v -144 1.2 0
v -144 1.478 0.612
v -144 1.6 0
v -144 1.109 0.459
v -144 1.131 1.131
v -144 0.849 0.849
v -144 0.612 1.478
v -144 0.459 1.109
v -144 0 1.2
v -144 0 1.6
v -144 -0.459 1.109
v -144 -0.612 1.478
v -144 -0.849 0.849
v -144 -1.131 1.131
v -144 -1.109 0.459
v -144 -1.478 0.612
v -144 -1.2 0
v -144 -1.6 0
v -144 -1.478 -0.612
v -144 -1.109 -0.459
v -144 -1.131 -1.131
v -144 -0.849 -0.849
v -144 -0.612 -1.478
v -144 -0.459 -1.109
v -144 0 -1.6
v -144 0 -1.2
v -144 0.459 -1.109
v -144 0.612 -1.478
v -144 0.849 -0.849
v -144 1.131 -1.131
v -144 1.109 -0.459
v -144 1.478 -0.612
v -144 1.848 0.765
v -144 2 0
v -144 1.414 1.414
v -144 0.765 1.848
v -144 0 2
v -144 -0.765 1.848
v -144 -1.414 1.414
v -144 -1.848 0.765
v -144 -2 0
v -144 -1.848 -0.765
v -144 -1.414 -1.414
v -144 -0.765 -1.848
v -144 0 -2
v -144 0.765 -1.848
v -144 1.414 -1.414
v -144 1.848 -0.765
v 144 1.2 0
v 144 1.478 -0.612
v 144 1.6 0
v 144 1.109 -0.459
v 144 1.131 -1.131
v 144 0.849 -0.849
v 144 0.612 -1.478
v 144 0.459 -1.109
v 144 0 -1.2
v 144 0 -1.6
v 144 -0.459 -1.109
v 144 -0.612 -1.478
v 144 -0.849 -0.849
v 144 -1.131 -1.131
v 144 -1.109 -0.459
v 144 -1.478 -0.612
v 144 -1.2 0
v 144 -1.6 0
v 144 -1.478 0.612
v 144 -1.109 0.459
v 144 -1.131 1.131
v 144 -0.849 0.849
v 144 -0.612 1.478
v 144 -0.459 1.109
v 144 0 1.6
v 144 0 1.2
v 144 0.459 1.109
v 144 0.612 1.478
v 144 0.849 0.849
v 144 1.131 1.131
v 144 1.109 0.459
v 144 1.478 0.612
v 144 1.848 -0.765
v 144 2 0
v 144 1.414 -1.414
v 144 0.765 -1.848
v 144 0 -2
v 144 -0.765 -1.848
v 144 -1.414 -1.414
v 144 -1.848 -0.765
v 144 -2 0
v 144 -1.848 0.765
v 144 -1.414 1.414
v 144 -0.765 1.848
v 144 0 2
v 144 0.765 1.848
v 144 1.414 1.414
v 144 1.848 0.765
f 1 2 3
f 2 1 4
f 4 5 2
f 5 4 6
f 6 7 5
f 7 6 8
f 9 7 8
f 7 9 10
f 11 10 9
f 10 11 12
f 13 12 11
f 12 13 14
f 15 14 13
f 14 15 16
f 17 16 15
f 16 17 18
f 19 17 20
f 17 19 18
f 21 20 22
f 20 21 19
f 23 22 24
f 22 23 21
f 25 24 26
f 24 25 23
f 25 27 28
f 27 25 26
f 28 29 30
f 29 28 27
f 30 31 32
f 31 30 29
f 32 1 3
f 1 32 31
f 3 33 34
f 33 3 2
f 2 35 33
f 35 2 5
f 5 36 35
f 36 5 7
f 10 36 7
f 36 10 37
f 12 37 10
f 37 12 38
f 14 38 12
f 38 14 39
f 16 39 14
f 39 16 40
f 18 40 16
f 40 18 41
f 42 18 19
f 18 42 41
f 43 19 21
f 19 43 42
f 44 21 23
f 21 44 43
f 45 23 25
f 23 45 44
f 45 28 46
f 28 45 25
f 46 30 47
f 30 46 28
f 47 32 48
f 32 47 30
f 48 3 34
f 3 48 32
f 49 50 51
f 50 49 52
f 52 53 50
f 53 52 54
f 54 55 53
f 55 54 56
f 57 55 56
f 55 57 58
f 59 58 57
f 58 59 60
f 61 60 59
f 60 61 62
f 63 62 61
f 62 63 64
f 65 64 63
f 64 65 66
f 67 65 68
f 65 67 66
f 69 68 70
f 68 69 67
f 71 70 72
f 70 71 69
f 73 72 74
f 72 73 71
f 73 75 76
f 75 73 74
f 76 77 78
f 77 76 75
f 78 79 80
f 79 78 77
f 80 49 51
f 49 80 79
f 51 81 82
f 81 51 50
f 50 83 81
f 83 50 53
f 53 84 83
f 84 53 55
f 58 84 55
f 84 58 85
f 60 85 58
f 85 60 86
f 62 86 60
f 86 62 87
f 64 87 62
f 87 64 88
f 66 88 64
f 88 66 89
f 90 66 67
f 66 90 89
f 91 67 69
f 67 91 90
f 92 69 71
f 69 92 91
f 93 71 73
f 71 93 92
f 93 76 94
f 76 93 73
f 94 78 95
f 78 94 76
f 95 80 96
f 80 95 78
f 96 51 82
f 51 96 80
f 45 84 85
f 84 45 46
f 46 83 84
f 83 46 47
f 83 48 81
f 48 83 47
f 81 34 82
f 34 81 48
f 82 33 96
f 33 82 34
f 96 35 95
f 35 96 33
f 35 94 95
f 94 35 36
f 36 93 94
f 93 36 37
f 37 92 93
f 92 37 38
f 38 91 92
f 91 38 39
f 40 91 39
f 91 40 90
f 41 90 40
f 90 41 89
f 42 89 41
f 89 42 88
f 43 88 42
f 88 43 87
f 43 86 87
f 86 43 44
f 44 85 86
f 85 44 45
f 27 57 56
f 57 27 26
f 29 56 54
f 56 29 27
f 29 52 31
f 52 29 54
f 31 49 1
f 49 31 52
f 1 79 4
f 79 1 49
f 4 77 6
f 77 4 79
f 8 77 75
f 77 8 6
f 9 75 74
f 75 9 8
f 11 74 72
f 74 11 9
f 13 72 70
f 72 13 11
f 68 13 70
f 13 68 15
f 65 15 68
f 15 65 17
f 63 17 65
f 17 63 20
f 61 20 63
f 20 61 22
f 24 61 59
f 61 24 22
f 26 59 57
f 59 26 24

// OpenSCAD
// file: ../p/4-4cyli.scad
use <../lib.scad>
function ldraw_lib__4_4cyli() = [
// 0 Cylinder 1.0
// 0 Name: 4-4cyli.dat
// 0 Author: James Jessiman
// 0 !LDRAW_ORG Primitive UPDATE 2005-01
// 0 !LICENSE Licensed under CC BY 2.0 and CC BY 4.0 : see CAreadme.txt
// 
// 0 BFC CERTIFY CCW
  [0,"BFC","CERTIFY"],
  [0,"BFC","CCW"],
// 
// 0 !HISTORY 1998-12-15 [PTadmin] Official Update 1998-10
// 0 !HISTORY 2002-03-23 [sbliss] Added BFC statement; merged headers from files in distributions LDraw 0.27 and Complete.
// 0 !HISTORY 2002-04-25 [PTadmin] Official Update 2002-02
// 0 !HISTORY 2004-12-14 [guyvivan] BFC CCW
// 0 !HISTORY 2005-12-28 [PTadmin] Official Update 2005-01
// 0 !HISTORY 2007-06-24 [PTadmin] Header formatted for Contributor Agreement
// 0 !HISTORY 2008-07-01 [PTadmin] Official Update 2008-01
// 
// 
// 4 16 1 1 0 0.9239 1 0.3827 0.9239 0 0.3827 1 0 0
  [4,16,1,1,0,0.9239,1,0.3827,0.9239,0,0.3827,1,0,0],
// 5 24 1 0 0 1 1 0 0.9239 0 0.3827 0.9239 0 -0.3827
  [5,24,1,0,0,1,1,0,0.9239,0,0.3827,0.9239,0,-0.3827],
// 4 16 0.9239 1 0.3827 0.7071 1 0.7071 0.7071 0 0.7071 0.9239 0 0.3827
  [4,16,0.9239,1,0.3827,0.7071,1,0.7071,0.7071,0,0.7071,0.9239,0,0.3827],
// 5 24 0.9239 0 0.3827 0.9239 1 0.3827 0.7071 0 0.7071 1 0 0
  [5,24,0.9239,0,0.3827,0.9239,1,0.3827,0.7071,0,0.7071,1,0,0],
// 4 16 0.7071 1 0.7071 0.3827 1 0.9239 0.3827 0 0.9239 0.7071 0 0.7071
  [4,16,0.7071,1,0.7071,0.3827,1,0.9239,0.3827,0,0.9239,0.7071,0,0.7071],
// 5 24 0.7071 0 0.7071 0.7071 1 0.7071 0.3827 0 0.9239 0.9239 0 0.3827
  [5,24,0.7071,0,0.7071,0.7071,1,0.7071,0.3827,0,0.9239,0.9239,0,0.3827],
// 4 16 0.3827 1 0.9239 0 1 1 0 0 1 0.3827 0 0.9239
  [4,16,0.3827,1,0.9239,0,1,1,0,0,1,0.3827,0,0.9239],
// 5 24 0.3827 0 0.9239 0.3827 1 0.9239 0 0 1 0.7071 0 0.7071
  [5,24,0.3827,0,0.9239,0.3827,1,0.9239,0,0,1,0.7071,0,0.7071],
// 4 16 0 1 1 -0.3827 1 0.9239 -0.3827 0 0.9239 0 0 1
  [4,16,0,1,1,-0.3827,1,0.9239,-0.3827,0,0.9239,0,0,1],
// 5 24 0 0 1 0 1 1 -0.3827 0 0.9239 0.3827 0 0.9239
  [5,24,0,0,1,0,1,1,-0.3827,0,0.9239,0.3827,0,0.9239],
// 4 16 -0.3827 1 0.9239 -0.7071 1 0.7071 -0.7071 0 0.7071 -0.3827 0 0.9239
  [4,16,-0.3827,1,0.9239,-0.7071,1,0.7071,-0.7071,0,0.7071,-0.3827,0,0.9239],
// 5 24 -0.3827 0 0.9239 -0.3827 1 0.9239 -0.7071 0 0.7071 0 0 1
  [5,24,-0.3827,0,0.9239,-0.3827,1,0.9239,-0.7071,0,0.7071,0,0,1],
// 4 16 -0.7071 1 0.7071 -0.9239 1 0.3827 -0.9239 0 0.3827 -0.7071 0 0.7071
  [4,16,-0.7071,1,0.7071,-0.9239,1,0.3827,-0.9239,0,0.3827,-0.7071,0,0.7071],
// 5 24 -0.7071 0 0.7071 -0.7071 1 0.7071 -0.9239 0 0.3827 -0.3827 0 0.9239
  [5,24,-0.7071,0,0.7071,-0.7071,1,0.7071,-0.9239,0,0.3827,-0.3827,0,0.9239],
// 4 16 -0.9239 1 0.3827 -1 1 0 -1 0 0 -0.9239 0 0.3827
  [4,16,-0.9239,1,0.3827,-1,1,0,-1,0,0,-0.9239,0,0.3827],
// 5 24 -0.9239 0 0.3827 -0.9239 1 0.3827 -1 0 0 -0.7071 0 0.7071
  [5,24,-0.9239,0,0.3827,-0.9239,1,0.3827,-1,0,0,-0.7071,0,0.7071],
// 4 16 -1 1 0 -0.9239 1 -0.3827 -0.9239 0 -0.3827 -1 0 0
  [4,16,-1,1,0,-0.9239,1,-0.3827,-0.9239,0,-0.3827,-1,0,0],
// 5 24 -1 0 0 -1 1 0 -0.9239 0 -0.3827 -0.9239 0 0.3827
  [5,24,-1,0,0,-1,1,0,-0.9239,0,-0.3827,-0.9239,0,0.3827],
// 4 16 -0.9239 1 -0.3827 -0.7071 1 -0.7071 -0.7071 0 -0.7071 -0.9239 0 -0.3827
  [4,16,-0.9239,1,-0.3827,-0.7071,1,-0.7071,-0.7071,0,-0.7071,-0.9239,0,-0.3827],
// 5 24 -0.9239 0 -0.3827 -0.9239 1 -0.3827 -0.7071 0 -0.7071 -1 0 0
  [5,24,-0.9239,0,-0.3827,-0.9239,1,-0.3827,-0.7071,0,-0.7071,-1,0,0],
// 4 16 -0.7071 1 -0.7071 -0.3827 1 -0.9239 -0.3827 0 -0.9239 -0.7071 0 -0.7071
  [4,16,-0.7071,1,-0.7071,-0.3827,1,-0.9239,-0.3827,0,-0.9239,-0.7071,0,-0.7071],
// 5 24 -0.7071 0 -0.7071 -0.7071 1 -0.7071 -0.3827 0 -0.9239 -0.9239 0 -0.3827
  [5,24,-0.7071,0,-0.7071,-0.7071,1,-0.7071,-0.3827,0,-0.9239,-0.9239,0,-0.3827],
// 4 16 -0.3827 1 -0.9239 0 1 -1 0 0 -1 -0.3827 0 -0.9239
  [4,16,-0.3827,1,-0.9239,0,1,-1,0,0,-1,-0.3827,0,-0.9239],
// 5 24 -0.3827 0 -0.9239 -0.3827 1 -0.9239 0 0 -1 -0.7071 0 -0.7071
  [5,24,-0.3827,0,-0.9239,-0.3827,1,-0.9239,0,0,-1,-0.7071,0,-0.7071],
// 4 16 0 1 -1 0.3827 1 -0.9239 0.3827 0 -0.9239 0 0 -1
  [4,16,0,1,-1,0.3827,1,-0.9239,0.3827,0,-0.9239,0,0,-1],
// 5 24 0 0 -1 0 1 -1 0.3827 0 -0.9239 -0.3827 0 -0.9239
  [5,24,0,0,-1,0,1,-1,0.3827,0,-0.9239,-0.3827,0,-0.9239],
// 4 16 0.3827 1 -0.9239 0.7071 1 -0.7071 0.7071 0 -0.7071 0.3827 0 -0.9239
  [4,16,0.3827,1,-0.9239,0.7071,1,-0.7071,0.7071,0,-0.7071,0.3827,0,-0.9239],
// 5 24 0.3827 0 -0.9239 0.3827 1 -0.9239 0.7071 0 -0.7071 0 0 -1
  [5,24,0.3827,0,-0.9239,0.3827,1,-0.9239,0.7071,0,-0.7071,0,0,-1],
// 4 16 0.7071 1 -0.7071 0.9239 1 -0.3827 0.9239 0 -0.3827 0.7071 0 -0.7071
  [4,16,0.7071,1,-0.7071,0.9239,1,-0.3827,0.9239,0,-0.3827,0.7071,0,-0.7071],
// 5 24 0.7071 0 -0.7071 0.7071 1 -0.7071 0.9239 0 -0.3827 0.3827 0 -0.9239
  [5,24,0.7071,0,-0.7071,0.7071,1,-0.7071,0.9239,0,-0.3827,0.3827,0,-0.9239],
// 4 16 0.9239 1 -0.3827 1 1 0 1 0 0 0.9239 0 -0.3827
  [4,16,0.9239,1,-0.3827,1,1,0,1,0,0,0.9239,0,-0.3827],
// 5 24 0.9239 0 -0.3827 0.9239 1 -0.3827 1 0 0 0.7071 0 -0.7071
  [5,24,0.9239,0,-0.3827,0.9239,1,-0.3827,1,0,0,0.7071,0,-0.7071],
// 0
];
module ldraw_lib__4_4cyli(step=0, col=false, unit=2/5, alt=false, line=0.2, solid=!$preview)
    makepoly(ldraw_lib__4_4cyli(), step=step, col=col, unit=unit, alt=alt, line=line, solid=solid);
ldraw_lib__4_4cyli(line=0.2);
// file: ../p/4-4ring4.scad
use <../lib.scad>
function ldraw_lib__4_4ring4() = [
// 0 Ring  4 x 1.0
// 0 Name: 4-4ring4.dat
// 0 Author: James Jessiman
// 0 !LDRAW_ORG Primitive UPDATE 2009-01
// 0 !LICENSE Licensed under CC BY 2.0 and CC BY 4.0 : see CAreadme.txt
// 
// 0 BFC CERTIFY CCW
  [0,"BFC","CERTIFY"],
  [0,"BFC","CCW"],
// 
// 0 !HISTORY 1998-12-15 [PTadmin] Official Update 1998-10
// 0 !HISTORY 2002-04-08 [BrickCaster] Modified for BFC compliance
// 0 !HISTORY 2002-04-25 [PTadmin] Official Update 2002-02
// 0 !HISTORY 2007-06-24 [PTadmin] Header formatted for Contributor Agreement
// 0 !HISTORY 2008-07-01 [PTadmin] Official Update 2008-01
// 0 !HISTORY 2008-08-26 [cwdee] Switch polygon winding and rename
// 0 !HISTORY 2009-05-02 [PTadmin] Official Update 2009-01
// 
// 
// 4 16 -1.9135 0 4.6195 -1.5308 0 3.6956 0 0 4 0 0 5
  [4,16,-1.9135,0,4.6195,-1.5308,0,3.6956,0,0,4,0,0,5],
// 4 16 -3.5355 0 3.5355 -2.8284 0 2.8284 -1.5308 0 3.6956 -1.9135 0 4.6195
  [4,16,-3.5355,0,3.5355,-2.8284,0,2.8284,-1.5308,0,3.6956,-1.9135,0,4.6195],
// 4 16 -4.6195 0 1.9135 -3.6956 0 1.5308 -2.8284 0 2.8284 -3.5355 0 3.5355
  [4,16,-4.6195,0,1.9135,-3.6956,0,1.5308,-2.8284,0,2.8284,-3.5355,0,3.5355],
// 4 16 -5 0 0 -4 0 0 -3.6956 0 1.5308 -4.6195 0 1.9135
  [4,16,-5,0,0,-4,0,0,-3.6956,0,1.5308,-4.6195,0,1.9135],
// 4 16 -4.6195 0 -1.9135 -3.6956 0 -1.5308 -4 0 0 -5 0 0
  [4,16,-4.6195,0,-1.9135,-3.6956,0,-1.5308,-4,0,0,-5,0,0],
// 4 16 -3.5355 0 -3.5355 -2.8284 0 -2.8284 -3.6956 0 -1.5308 -4.6195 0 -1.9135
  [4,16,-3.5355,0,-3.5355,-2.8284,0,-2.8284,-3.6956,0,-1.5308,-4.6195,0,-1.9135],
// 4 16 -1.9135 0 -4.6195 -1.5308 0 -3.6956 -2.8284 0 -2.8284 -3.5355 0 -3.5355
  [4,16,-1.9135,0,-4.6195,-1.5308,0,-3.6956,-2.8284,0,-2.8284,-3.5355,0,-3.5355],
// 4 16 0 0 -5 0 0 -4 -1.5308 0 -3.6956 -1.9135 0 -4.6195
  [4,16,0,0,-5,0,0,-4,-1.5308,0,-3.6956,-1.9135,0,-4.6195],
// 4 16 1.9135 0 -4.6195 1.5308 0 -3.6956 0 0 -4 0 0 -5
  [4,16,1.9135,0,-4.6195,1.5308,0,-3.6956,0,0,-4,0,0,-5],
// 4 16 3.5355 0 -3.5355 2.8284 0 -2.8284 1.5308 0 -3.6956 1.9135 0 -4.6195
  [4,16,3.5355,0,-3.5355,2.8284,0,-2.8284,1.5308,0,-3.6956,1.9135,0,-4.6195],
// 4 16 4.6195 0 -1.9135 3.6956 0 -1.5308 2.8284 0 -2.8284 3.5355 0 -3.5355
  [4,16,4.6195,0,-1.9135,3.6956,0,-1.5308,2.8284,0,-2.8284,3.5355,0,-3.5355],
// 4 16 5 0 0 4 0 0 3.6956 0 -1.5308 4.6195 0 -1.9135
  [4,16,5,0,0,4,0,0,3.6956,0,-1.5308,4.6195,0,-1.9135],
// 4 16 4.6195 0 1.9135 3.6956 0 1.5308 4 0 0 5 0 0
  [4,16,4.6195,0,1.9135,3.6956,0,1.5308,4,0,0,5,0,0],
// 4 16 3.5355 0 3.5355 2.8284 0 2.8284 3.6956 0 1.5308 4.6195 0 1.9135
  [4,16,3.5355,0,3.5355,2.8284,0,2.8284,3.6956,0,1.5308,4.6195,0,1.9135],
// 4 16 1.9135 0 4.6195 1.5308 0 3.6956 2.8284 0 2.8284 3.5355 0 3.5355
  [4,16,1.9135,0,4.6195,1.5308,0,3.6956,2.8284,0,2.8284,3.5355,0,3.5355],
// 4 16 0 0 5 0 0 4 1.5308 0 3.6956 1.9135 0 4.6195
  [4,16,0,0,5,0,0,4,1.5308,0,3.6956,1.9135,0,4.6195],
// 0
];
module ldraw_lib__4_4ring4(step=0, col=false, unit=2/5, alt=false, line=0.2, solid=!$preview)
    makepoly(ldraw_lib__4_4ring4(), step=step, col=col, unit=unit, alt=alt, line=line, solid=solid);
ldraw_lib__4_4ring4(line=0.2);
// file: ../p/4-4ring3.scad
use <../lib.scad>
function ldraw_lib__4_4ring3() = [
// 0 Ring  3 x 1.0
// 0 Name: 4-4ring3.dat
// 0 Author: James Jessiman
// 0 !LDRAW_ORG Primitive UPDATE 2009-01
// 0 !LICENSE Licensed under CC BY 2.0 and CC BY 4.0 : see CAreadme.txt
// 
// 0 BFC CERTIFY CCW
  [0,"BFC","CERTIFY"],
  [0,"BFC","CCW"],
// 
// 0 !HISTORY 1998-12-15 [PTadmin] Official Update 1998-10
// 0 !HISTORY 2002-04-05 [hafhead] Added BFC statement
// 0 !HISTORY 2002-04-25 [PTadmin] Official Update 2002-02
// 0 !HISTORY 2007-06-24 [PTadmin] Header formatted for Contributor Agreement
// 0 !HISTORY 2008-07-01 [PTadmin] Official Update 2008-01
// 0 !HISTORY 2008-08-26 [cwdee] Switch polygon winding and rename
// 0 !HISTORY 2009-05-02 [PTadmin] Official Update 2009-01
// 
// 
// 4 16 -1.5308 0 3.6956 -1.1481 0 2.7717 0 0 3 0 0 4
  [4,16,-1.5308,0,3.6956,-1.1481,0,2.7717,0,0,3,0,0,4],
// 4 16 -2.8284 0 2.8284 -2.1213 0 2.1213 -1.1481 0 2.7717 -1.5308 0 3.6956
  [4,16,-2.8284,0,2.8284,-2.1213,0,2.1213,-1.1481,0,2.7717,-1.5308,0,3.6956],
// 4 16 -3.6956 0 1.5308 -2.7717 0 1.1481 -2.1213 0 2.1213 -2.8284 0 2.8284
  [4,16,-3.6956,0,1.5308,-2.7717,0,1.1481,-2.1213,0,2.1213,-2.8284,0,2.8284],
// 4 16 -4 0 0 -3 0 0 -2.7717 0 1.1481 -3.6956 0 1.5308
  [4,16,-4,0,0,-3,0,0,-2.7717,0,1.1481,-3.6956,0,1.5308],
// 4 16 -3.6956 0 -1.5308 -2.7717 0 -1.1481 -3 0 0 -4 0 0
  [4,16,-3.6956,0,-1.5308,-2.7717,0,-1.1481,-3,0,0,-4,0,0],
// 4 16 -2.8284 0 -2.8284 -2.1213 0 -2.1213 -2.7717 0 -1.1481 -3.6956 0 -1.5308
  [4,16,-2.8284,0,-2.8284,-2.1213,0,-2.1213,-2.7717,0,-1.1481,-3.6956,0,-1.5308],
// 4 16 -1.5308 0 -3.6956 -1.1481 0 -2.7717 -2.1213 0 -2.1213 -2.8284 0 -2.8284
  [4,16,-1.5308,0,-3.6956,-1.1481,0,-2.7717,-2.1213,0,-2.1213,-2.8284,0,-2.8284],
// 4 16 0 0 -4 0 0 -3 -1.1481 0 -2.7717 -1.5308 0 -3.6956
  [4,16,0,0,-4,0,0,-3,-1.1481,0,-2.7717,-1.5308,0,-3.6956],
// 4 16 1.5308 0 -3.6956 1.1481 0 -2.7717 0 0 -3 0 0 -4
  [4,16,1.5308,0,-3.6956,1.1481,0,-2.7717,0,0,-3,0,0,-4],
// 4 16 2.8284 0 -2.8284 2.1213 0 -2.1213 1.1481 0 -2.7717 1.5308 0 -3.6956
  [4,16,2.8284,0,-2.8284,2.1213,0,-2.1213,1.1481,0,-2.7717,1.5308,0,-3.6956],
// 4 16 3.6956 0 -1.5308 2.7717 0 -1.1481 2.1213 0 -2.1213 2.8284 0 -2.8284
  [4,16,3.6956,0,-1.5308,2.7717,0,-1.1481,2.1213,0,-2.1213,2.8284,0,-2.8284],
// 4 16 4 0 0 3 0 0 2.7717 0 -1.1481 3.6956 0 -1.5308
  [4,16,4,0,0,3,0,0,2.7717,0,-1.1481,3.6956,0,-1.5308],
// 4 16 3.6956 0 1.5308 2.7717 0 1.1481 3 0 0 4 0 0
  [4,16,3.6956,0,1.5308,2.7717,0,1.1481,3,0,0,4,0,0],
// 4 16 2.8284 0 2.8284 2.1213 0 2.1213 2.7717 0 1.1481 3.6956 0 1.5308
  [4,16,2.8284,0,2.8284,2.1213,0,2.1213,2.7717,0,1.1481,3.6956,0,1.5308],
// 4 16 1.5308 0 3.6956 1.1481 0 2.7717 2.1213 0 2.1213 2.8284 0 2.8284
  [4,16,1.5308,0,3.6956,1.1481,0,2.7717,2.1213,0,2.1213,2.8284,0,2.8284],
// 4 16 0 0 4 0 0 3 1.1481 0 2.7717 1.5308 0 3.6956
  [4,16,0,0,4,0,0,3,1.1481,0,2.7717,1.5308,0,3.6956],
// 0
];
module ldraw_lib__4_4ring3(step=0, col=false, unit=2/5, alt=false, line=0.2, solid=!$preview)
    makepoly(ldraw_lib__4_4ring3(), step=step, col=col, unit=unit, alt=alt, line=line, solid=solid);
ldraw_lib__4_4ring3(line=0.2);
// file: ../p/4-4edge.scad
use <../lib.scad>
function ldraw_lib__4_4edge() = [
// 0 Circle 1.0
// 0 Name: 4-4edge.dat
// 0 Author: James Jessiman
// 0 !LDRAW_ORG Primitive UPDATE 2017-01
// 0 !LICENSE Licensed under CC BY 4.0 : see CAreadme.txt
// 
// 0 BFC CERTIFY CCW
  [0,"BFC","CERTIFY"],
  [0,"BFC","CCW"],
// 
// 0 !HISTORY 1998-12-15 [PTadmin] Official Update 1998-10
// 0 !HISTORY 2005-12-28 [PTadmin] Official Update 2005-01
// 0 !HISTORY 2007-06-24 [PTadmin] Header formatted for Contributor Agreement
// 0 !HISTORY 2008-07-01 [PTadmin] Official Update 2008-01
// 0 !HISTORY 2017-01-15 [Steffen] BFCed
// 0 !HISTORY 2017-12-30 [PTadmin] Official Update 2017-01
// 
// 
// 2 24 1 0 0 0.9239 0 0.3827
  [2,24,1,0,0,0.9239,0,0.3827],
// 2 24 0.9239 0 0.3827 0.7071 0 0.7071
  [2,24,0.9239,0,0.3827,0.7071,0,0.7071],
// 2 24 0.7071 0 0.7071 0.3827 0 0.9239
  [2,24,0.7071,0,0.7071,0.3827,0,0.9239],
// 2 24 0.3827 0 0.9239 0 0 1
  [2,24,0.3827,0,0.9239,0,0,1],
// 2 24 0 0 1 -0.3827 0 0.9239
  [2,24,0,0,1,-0.3827,0,0.9239],
// 2 24 -0.3827 0 0.9239 -0.7071 0 0.7071
  [2,24,-0.3827,0,0.9239,-0.7071,0,0.7071],
// 2 24 -0.7071 0 0.7071 -0.9239 0 0.3827
  [2,24,-0.7071,0,0.7071,-0.9239,0,0.3827],
// 2 24 -0.9239 0 0.3827 -1 0 -0
  [2,24,-0.9239,0,0.3827,-1,0,-0],
// 2 24 -1 0 -0 -0.9239 0 -0.3827
  [2,24,-1,0,-0,-0.9239,0,-0.3827],
// 2 24 -0.9239 0 -0.3827 -0.7071 0 -0.7071
  [2,24,-0.9239,0,-0.3827,-0.7071,0,-0.7071],
// 2 24 -0.7071 0 -0.7071 -0.3827 0 -0.9239
  [2,24,-0.7071,0,-0.7071,-0.3827,0,-0.9239],
// 2 24 -0.3827 0 -0.9239 0 0 -1
  [2,24,-0.3827,0,-0.9239,0,0,-1],
// 2 24 0 0 -1 0.3827 0 -0.9239
  [2,24,0,0,-1,0.3827,0,-0.9239],
// 2 24 0.3827 0 -0.9239 0.7071 0 -0.7071
  [2,24,0.3827,0,-0.9239,0.7071,0,-0.7071],
// 2 24 0.7071 0 -0.7071 0.9239 0 -0.3827
  [2,24,0.7071,0,-0.7071,0.9239,0,-0.3827],
// 2 24 0.9239 0 -0.3827 1 0 0
  [2,24,0.9239,0,-0.3827,1,0,0],
];
module ldraw_lib__4_4edge(step=0, col=false, unit=2/5, alt=false, line=0.2, solid=!$preview)
    makepoly(ldraw_lib__4_4edge(), step=step, col=col, unit=unit, alt=alt, line=line, solid=solid);
ldraw_lib__4_4edge(line=0.2);
// file: 71533k03.scad
use <../lib.scad>
use <../p/4-4cyli.scad>
function ldraw_lib__71533k03() = [
// 0 ~Technic Pneumatic Tube Segment
// 0 Name: 71533k03.dat
// 0 Author: Jaco van der Molen [Jaco]
// 0 !LDRAW_ORG Part Flexible_Section UPDATE 2020-01
// 0 !LICENSE Licensed under CC BY 4.0 : see CAreadme.txt
// 
// 0 BFC CERTIFY CW
  [0,"BFC","CERTIFY"],
  [0,"BFC","CW"],
// 
// 0 !HISTORY 2003-11-30 [Steffen] BFCed
// 0 !HISTORY 2009-12-29 [PTadmin] Official Update 2009-03
// 0 !HISTORY 2020-06-27 [PTadmin] Renamed from 166
// 0 !HISTORY 2020-06-28 [PTadmin] Official Update 2020-01
// 
// 
// 1 16 0 0 0 5 0 0 0 1 0 0 0 5 4-4cyli.dat
  [1,16,0,0,0,5,0,0,0,1,0,0,0,5, ldraw_lib__4_4cyli()],
// 0 BFC INVERTNEXT
  [0,"BFC","INVERTNEXT"],
// 1 16 0 0 0 3 0 0 0 1 0 0 0 3 4-4cyli.dat
  [1,16,0,0,0,3,0,0,0,1,0,0,0,3, ldraw_lib__4_4cyli()],
// 0
];
module ldraw_lib__71533k03(step=0, col=false, unit=2/5, alt=false, line=0.2, solid=!$preview)
    makepoly(ldraw_lib__71533k03(), step=step, col=col, unit=unit, alt=alt, line=line, solid=solid);
ldraw_lib__71533k03(line=0.2);
// file: 71533k02.scad
use <../lib.scad>
use <../p/4-4edge.scad>
use <../p/4-4ring3.scad>
use <../p/4-4ring4.scad>
function ldraw_lib__71533k02() = [
// 0 ~Technic Pneumatic Tube End (Non-Bulged)
// 0 Name: 71533k02.dat
// 0 Author: Steffen [Steffen]
// 0 !LDRAW_ORG Part Flexible_Section UPDATE 2020-01
// 0 !LICENSE Licensed under CC BY 4.0 : see CAreadme.txt
// 
// 0 BFC CERTIFY CCW
  [0,"BFC","CERTIFY"],
  [0,"BFC","CCW"],
// 
// 0 !HISTORY 2020-06-28 [PTadmin] Official Update 2020-01
// 
// 
// 0 // This file goes together with 71533k01.dat and 71533k03.dat.
// 0 // Those 3 files can be used to create Technic Pneumatic Tubes
// 0 // with either bulged or non-bulged ends.
// 
// 1 16 0 0 0 1 0 0 0 1 0 0 0 1 4-4ring3.dat
  [1,16,0,0,0,1,0,0,0,1,0,0,0,1, ldraw_lib__4_4ring3()],
// 1 16 0 0 0 1 0 0 0 1 0 0 0 1 4-4ring4.dat
  [1,16,0,0,0,1,0,0,0,1,0,0,0,1, ldraw_lib__4_4ring4()],
// 1 16 0 0 0 3 0 0 0 3 0 0 0 3 4-4edge.dat
  [1,16,0,0,0,3,0,0,0,3,0,0,0,3, ldraw_lib__4_4edge()],
// 1 16 0 0 0 5 0 0 0 5 0 0 0 5 4-4edge.dat
  [1,16,0,0,0,5,0,0,0,5,0,0,0,5, ldraw_lib__4_4edge()],
];
module ldraw_lib__71533k02(step=0, col=false, unit=2/5, alt=false, line=0.2, solid=!$preview)
    makepoly(ldraw_lib__71533k02(), step=step, col=col, unit=unit, alt=alt, line=line, solid=solid);
ldraw_lib__71533k02(line=0.2);
// main file
use <../lib.scad>
use <71533k02.scad>
use <71533k03.scad>
function ldraw_lib__87949_f1() = [
// 0 Technic Pneumatic Tube 36L
// 0 Name: 87949-f1.dat
// 0 Author: Philippe Hurbain [Philo]
// 0 !LDRAW_ORG Part UPDATE 2020-02
// 0 !LICENSE Licensed under CC BY 4.0 : see CAreadme.txt
// 
// 0 BFC CERTIFY CCW
  [0,"BFC","CERTIFY"],
  [0,"BFC","CCW"],
// 
// 0 !KEYWORDS 288 mm
// 
// 0 !HISTORY 2020-09-05 [PTadmin] Official Update 2020-02
// 
// 
// 1 16 -360 0 0 0 1 0 1 0 0 0 0 1 71533k02.dat
  [1,16,-360,0,0,0,1,0,1,0,0,0,0,1, ldraw_lib__71533k02()],
// 1 16 360 0 0 0 -1 0 -1 0 0 0 0 1 71533k02.dat
  [1,16,360,0,0,0,-1,0,-1,0,0,0,0,1, ldraw_lib__71533k02()],
// 1 16 -360 0 0 0 720 0 1 0 0 0 0 1 71533k03.dat
  [1,16,-360,0,0,0,720,0,1,0,0,0,0,1, ldraw_lib__71533k03()],
];
module ldraw_lib__87949_f1(step=0, col=false, unit=2/5, alt=false, line=0.2, solid=!$preview)
    makepoly(ldraw_lib__87949_f1(), step=step, col=col, unit=unit, alt=alt, line=line, solid=solid);
ldraw_lib__87949_f1(line=0.2);
